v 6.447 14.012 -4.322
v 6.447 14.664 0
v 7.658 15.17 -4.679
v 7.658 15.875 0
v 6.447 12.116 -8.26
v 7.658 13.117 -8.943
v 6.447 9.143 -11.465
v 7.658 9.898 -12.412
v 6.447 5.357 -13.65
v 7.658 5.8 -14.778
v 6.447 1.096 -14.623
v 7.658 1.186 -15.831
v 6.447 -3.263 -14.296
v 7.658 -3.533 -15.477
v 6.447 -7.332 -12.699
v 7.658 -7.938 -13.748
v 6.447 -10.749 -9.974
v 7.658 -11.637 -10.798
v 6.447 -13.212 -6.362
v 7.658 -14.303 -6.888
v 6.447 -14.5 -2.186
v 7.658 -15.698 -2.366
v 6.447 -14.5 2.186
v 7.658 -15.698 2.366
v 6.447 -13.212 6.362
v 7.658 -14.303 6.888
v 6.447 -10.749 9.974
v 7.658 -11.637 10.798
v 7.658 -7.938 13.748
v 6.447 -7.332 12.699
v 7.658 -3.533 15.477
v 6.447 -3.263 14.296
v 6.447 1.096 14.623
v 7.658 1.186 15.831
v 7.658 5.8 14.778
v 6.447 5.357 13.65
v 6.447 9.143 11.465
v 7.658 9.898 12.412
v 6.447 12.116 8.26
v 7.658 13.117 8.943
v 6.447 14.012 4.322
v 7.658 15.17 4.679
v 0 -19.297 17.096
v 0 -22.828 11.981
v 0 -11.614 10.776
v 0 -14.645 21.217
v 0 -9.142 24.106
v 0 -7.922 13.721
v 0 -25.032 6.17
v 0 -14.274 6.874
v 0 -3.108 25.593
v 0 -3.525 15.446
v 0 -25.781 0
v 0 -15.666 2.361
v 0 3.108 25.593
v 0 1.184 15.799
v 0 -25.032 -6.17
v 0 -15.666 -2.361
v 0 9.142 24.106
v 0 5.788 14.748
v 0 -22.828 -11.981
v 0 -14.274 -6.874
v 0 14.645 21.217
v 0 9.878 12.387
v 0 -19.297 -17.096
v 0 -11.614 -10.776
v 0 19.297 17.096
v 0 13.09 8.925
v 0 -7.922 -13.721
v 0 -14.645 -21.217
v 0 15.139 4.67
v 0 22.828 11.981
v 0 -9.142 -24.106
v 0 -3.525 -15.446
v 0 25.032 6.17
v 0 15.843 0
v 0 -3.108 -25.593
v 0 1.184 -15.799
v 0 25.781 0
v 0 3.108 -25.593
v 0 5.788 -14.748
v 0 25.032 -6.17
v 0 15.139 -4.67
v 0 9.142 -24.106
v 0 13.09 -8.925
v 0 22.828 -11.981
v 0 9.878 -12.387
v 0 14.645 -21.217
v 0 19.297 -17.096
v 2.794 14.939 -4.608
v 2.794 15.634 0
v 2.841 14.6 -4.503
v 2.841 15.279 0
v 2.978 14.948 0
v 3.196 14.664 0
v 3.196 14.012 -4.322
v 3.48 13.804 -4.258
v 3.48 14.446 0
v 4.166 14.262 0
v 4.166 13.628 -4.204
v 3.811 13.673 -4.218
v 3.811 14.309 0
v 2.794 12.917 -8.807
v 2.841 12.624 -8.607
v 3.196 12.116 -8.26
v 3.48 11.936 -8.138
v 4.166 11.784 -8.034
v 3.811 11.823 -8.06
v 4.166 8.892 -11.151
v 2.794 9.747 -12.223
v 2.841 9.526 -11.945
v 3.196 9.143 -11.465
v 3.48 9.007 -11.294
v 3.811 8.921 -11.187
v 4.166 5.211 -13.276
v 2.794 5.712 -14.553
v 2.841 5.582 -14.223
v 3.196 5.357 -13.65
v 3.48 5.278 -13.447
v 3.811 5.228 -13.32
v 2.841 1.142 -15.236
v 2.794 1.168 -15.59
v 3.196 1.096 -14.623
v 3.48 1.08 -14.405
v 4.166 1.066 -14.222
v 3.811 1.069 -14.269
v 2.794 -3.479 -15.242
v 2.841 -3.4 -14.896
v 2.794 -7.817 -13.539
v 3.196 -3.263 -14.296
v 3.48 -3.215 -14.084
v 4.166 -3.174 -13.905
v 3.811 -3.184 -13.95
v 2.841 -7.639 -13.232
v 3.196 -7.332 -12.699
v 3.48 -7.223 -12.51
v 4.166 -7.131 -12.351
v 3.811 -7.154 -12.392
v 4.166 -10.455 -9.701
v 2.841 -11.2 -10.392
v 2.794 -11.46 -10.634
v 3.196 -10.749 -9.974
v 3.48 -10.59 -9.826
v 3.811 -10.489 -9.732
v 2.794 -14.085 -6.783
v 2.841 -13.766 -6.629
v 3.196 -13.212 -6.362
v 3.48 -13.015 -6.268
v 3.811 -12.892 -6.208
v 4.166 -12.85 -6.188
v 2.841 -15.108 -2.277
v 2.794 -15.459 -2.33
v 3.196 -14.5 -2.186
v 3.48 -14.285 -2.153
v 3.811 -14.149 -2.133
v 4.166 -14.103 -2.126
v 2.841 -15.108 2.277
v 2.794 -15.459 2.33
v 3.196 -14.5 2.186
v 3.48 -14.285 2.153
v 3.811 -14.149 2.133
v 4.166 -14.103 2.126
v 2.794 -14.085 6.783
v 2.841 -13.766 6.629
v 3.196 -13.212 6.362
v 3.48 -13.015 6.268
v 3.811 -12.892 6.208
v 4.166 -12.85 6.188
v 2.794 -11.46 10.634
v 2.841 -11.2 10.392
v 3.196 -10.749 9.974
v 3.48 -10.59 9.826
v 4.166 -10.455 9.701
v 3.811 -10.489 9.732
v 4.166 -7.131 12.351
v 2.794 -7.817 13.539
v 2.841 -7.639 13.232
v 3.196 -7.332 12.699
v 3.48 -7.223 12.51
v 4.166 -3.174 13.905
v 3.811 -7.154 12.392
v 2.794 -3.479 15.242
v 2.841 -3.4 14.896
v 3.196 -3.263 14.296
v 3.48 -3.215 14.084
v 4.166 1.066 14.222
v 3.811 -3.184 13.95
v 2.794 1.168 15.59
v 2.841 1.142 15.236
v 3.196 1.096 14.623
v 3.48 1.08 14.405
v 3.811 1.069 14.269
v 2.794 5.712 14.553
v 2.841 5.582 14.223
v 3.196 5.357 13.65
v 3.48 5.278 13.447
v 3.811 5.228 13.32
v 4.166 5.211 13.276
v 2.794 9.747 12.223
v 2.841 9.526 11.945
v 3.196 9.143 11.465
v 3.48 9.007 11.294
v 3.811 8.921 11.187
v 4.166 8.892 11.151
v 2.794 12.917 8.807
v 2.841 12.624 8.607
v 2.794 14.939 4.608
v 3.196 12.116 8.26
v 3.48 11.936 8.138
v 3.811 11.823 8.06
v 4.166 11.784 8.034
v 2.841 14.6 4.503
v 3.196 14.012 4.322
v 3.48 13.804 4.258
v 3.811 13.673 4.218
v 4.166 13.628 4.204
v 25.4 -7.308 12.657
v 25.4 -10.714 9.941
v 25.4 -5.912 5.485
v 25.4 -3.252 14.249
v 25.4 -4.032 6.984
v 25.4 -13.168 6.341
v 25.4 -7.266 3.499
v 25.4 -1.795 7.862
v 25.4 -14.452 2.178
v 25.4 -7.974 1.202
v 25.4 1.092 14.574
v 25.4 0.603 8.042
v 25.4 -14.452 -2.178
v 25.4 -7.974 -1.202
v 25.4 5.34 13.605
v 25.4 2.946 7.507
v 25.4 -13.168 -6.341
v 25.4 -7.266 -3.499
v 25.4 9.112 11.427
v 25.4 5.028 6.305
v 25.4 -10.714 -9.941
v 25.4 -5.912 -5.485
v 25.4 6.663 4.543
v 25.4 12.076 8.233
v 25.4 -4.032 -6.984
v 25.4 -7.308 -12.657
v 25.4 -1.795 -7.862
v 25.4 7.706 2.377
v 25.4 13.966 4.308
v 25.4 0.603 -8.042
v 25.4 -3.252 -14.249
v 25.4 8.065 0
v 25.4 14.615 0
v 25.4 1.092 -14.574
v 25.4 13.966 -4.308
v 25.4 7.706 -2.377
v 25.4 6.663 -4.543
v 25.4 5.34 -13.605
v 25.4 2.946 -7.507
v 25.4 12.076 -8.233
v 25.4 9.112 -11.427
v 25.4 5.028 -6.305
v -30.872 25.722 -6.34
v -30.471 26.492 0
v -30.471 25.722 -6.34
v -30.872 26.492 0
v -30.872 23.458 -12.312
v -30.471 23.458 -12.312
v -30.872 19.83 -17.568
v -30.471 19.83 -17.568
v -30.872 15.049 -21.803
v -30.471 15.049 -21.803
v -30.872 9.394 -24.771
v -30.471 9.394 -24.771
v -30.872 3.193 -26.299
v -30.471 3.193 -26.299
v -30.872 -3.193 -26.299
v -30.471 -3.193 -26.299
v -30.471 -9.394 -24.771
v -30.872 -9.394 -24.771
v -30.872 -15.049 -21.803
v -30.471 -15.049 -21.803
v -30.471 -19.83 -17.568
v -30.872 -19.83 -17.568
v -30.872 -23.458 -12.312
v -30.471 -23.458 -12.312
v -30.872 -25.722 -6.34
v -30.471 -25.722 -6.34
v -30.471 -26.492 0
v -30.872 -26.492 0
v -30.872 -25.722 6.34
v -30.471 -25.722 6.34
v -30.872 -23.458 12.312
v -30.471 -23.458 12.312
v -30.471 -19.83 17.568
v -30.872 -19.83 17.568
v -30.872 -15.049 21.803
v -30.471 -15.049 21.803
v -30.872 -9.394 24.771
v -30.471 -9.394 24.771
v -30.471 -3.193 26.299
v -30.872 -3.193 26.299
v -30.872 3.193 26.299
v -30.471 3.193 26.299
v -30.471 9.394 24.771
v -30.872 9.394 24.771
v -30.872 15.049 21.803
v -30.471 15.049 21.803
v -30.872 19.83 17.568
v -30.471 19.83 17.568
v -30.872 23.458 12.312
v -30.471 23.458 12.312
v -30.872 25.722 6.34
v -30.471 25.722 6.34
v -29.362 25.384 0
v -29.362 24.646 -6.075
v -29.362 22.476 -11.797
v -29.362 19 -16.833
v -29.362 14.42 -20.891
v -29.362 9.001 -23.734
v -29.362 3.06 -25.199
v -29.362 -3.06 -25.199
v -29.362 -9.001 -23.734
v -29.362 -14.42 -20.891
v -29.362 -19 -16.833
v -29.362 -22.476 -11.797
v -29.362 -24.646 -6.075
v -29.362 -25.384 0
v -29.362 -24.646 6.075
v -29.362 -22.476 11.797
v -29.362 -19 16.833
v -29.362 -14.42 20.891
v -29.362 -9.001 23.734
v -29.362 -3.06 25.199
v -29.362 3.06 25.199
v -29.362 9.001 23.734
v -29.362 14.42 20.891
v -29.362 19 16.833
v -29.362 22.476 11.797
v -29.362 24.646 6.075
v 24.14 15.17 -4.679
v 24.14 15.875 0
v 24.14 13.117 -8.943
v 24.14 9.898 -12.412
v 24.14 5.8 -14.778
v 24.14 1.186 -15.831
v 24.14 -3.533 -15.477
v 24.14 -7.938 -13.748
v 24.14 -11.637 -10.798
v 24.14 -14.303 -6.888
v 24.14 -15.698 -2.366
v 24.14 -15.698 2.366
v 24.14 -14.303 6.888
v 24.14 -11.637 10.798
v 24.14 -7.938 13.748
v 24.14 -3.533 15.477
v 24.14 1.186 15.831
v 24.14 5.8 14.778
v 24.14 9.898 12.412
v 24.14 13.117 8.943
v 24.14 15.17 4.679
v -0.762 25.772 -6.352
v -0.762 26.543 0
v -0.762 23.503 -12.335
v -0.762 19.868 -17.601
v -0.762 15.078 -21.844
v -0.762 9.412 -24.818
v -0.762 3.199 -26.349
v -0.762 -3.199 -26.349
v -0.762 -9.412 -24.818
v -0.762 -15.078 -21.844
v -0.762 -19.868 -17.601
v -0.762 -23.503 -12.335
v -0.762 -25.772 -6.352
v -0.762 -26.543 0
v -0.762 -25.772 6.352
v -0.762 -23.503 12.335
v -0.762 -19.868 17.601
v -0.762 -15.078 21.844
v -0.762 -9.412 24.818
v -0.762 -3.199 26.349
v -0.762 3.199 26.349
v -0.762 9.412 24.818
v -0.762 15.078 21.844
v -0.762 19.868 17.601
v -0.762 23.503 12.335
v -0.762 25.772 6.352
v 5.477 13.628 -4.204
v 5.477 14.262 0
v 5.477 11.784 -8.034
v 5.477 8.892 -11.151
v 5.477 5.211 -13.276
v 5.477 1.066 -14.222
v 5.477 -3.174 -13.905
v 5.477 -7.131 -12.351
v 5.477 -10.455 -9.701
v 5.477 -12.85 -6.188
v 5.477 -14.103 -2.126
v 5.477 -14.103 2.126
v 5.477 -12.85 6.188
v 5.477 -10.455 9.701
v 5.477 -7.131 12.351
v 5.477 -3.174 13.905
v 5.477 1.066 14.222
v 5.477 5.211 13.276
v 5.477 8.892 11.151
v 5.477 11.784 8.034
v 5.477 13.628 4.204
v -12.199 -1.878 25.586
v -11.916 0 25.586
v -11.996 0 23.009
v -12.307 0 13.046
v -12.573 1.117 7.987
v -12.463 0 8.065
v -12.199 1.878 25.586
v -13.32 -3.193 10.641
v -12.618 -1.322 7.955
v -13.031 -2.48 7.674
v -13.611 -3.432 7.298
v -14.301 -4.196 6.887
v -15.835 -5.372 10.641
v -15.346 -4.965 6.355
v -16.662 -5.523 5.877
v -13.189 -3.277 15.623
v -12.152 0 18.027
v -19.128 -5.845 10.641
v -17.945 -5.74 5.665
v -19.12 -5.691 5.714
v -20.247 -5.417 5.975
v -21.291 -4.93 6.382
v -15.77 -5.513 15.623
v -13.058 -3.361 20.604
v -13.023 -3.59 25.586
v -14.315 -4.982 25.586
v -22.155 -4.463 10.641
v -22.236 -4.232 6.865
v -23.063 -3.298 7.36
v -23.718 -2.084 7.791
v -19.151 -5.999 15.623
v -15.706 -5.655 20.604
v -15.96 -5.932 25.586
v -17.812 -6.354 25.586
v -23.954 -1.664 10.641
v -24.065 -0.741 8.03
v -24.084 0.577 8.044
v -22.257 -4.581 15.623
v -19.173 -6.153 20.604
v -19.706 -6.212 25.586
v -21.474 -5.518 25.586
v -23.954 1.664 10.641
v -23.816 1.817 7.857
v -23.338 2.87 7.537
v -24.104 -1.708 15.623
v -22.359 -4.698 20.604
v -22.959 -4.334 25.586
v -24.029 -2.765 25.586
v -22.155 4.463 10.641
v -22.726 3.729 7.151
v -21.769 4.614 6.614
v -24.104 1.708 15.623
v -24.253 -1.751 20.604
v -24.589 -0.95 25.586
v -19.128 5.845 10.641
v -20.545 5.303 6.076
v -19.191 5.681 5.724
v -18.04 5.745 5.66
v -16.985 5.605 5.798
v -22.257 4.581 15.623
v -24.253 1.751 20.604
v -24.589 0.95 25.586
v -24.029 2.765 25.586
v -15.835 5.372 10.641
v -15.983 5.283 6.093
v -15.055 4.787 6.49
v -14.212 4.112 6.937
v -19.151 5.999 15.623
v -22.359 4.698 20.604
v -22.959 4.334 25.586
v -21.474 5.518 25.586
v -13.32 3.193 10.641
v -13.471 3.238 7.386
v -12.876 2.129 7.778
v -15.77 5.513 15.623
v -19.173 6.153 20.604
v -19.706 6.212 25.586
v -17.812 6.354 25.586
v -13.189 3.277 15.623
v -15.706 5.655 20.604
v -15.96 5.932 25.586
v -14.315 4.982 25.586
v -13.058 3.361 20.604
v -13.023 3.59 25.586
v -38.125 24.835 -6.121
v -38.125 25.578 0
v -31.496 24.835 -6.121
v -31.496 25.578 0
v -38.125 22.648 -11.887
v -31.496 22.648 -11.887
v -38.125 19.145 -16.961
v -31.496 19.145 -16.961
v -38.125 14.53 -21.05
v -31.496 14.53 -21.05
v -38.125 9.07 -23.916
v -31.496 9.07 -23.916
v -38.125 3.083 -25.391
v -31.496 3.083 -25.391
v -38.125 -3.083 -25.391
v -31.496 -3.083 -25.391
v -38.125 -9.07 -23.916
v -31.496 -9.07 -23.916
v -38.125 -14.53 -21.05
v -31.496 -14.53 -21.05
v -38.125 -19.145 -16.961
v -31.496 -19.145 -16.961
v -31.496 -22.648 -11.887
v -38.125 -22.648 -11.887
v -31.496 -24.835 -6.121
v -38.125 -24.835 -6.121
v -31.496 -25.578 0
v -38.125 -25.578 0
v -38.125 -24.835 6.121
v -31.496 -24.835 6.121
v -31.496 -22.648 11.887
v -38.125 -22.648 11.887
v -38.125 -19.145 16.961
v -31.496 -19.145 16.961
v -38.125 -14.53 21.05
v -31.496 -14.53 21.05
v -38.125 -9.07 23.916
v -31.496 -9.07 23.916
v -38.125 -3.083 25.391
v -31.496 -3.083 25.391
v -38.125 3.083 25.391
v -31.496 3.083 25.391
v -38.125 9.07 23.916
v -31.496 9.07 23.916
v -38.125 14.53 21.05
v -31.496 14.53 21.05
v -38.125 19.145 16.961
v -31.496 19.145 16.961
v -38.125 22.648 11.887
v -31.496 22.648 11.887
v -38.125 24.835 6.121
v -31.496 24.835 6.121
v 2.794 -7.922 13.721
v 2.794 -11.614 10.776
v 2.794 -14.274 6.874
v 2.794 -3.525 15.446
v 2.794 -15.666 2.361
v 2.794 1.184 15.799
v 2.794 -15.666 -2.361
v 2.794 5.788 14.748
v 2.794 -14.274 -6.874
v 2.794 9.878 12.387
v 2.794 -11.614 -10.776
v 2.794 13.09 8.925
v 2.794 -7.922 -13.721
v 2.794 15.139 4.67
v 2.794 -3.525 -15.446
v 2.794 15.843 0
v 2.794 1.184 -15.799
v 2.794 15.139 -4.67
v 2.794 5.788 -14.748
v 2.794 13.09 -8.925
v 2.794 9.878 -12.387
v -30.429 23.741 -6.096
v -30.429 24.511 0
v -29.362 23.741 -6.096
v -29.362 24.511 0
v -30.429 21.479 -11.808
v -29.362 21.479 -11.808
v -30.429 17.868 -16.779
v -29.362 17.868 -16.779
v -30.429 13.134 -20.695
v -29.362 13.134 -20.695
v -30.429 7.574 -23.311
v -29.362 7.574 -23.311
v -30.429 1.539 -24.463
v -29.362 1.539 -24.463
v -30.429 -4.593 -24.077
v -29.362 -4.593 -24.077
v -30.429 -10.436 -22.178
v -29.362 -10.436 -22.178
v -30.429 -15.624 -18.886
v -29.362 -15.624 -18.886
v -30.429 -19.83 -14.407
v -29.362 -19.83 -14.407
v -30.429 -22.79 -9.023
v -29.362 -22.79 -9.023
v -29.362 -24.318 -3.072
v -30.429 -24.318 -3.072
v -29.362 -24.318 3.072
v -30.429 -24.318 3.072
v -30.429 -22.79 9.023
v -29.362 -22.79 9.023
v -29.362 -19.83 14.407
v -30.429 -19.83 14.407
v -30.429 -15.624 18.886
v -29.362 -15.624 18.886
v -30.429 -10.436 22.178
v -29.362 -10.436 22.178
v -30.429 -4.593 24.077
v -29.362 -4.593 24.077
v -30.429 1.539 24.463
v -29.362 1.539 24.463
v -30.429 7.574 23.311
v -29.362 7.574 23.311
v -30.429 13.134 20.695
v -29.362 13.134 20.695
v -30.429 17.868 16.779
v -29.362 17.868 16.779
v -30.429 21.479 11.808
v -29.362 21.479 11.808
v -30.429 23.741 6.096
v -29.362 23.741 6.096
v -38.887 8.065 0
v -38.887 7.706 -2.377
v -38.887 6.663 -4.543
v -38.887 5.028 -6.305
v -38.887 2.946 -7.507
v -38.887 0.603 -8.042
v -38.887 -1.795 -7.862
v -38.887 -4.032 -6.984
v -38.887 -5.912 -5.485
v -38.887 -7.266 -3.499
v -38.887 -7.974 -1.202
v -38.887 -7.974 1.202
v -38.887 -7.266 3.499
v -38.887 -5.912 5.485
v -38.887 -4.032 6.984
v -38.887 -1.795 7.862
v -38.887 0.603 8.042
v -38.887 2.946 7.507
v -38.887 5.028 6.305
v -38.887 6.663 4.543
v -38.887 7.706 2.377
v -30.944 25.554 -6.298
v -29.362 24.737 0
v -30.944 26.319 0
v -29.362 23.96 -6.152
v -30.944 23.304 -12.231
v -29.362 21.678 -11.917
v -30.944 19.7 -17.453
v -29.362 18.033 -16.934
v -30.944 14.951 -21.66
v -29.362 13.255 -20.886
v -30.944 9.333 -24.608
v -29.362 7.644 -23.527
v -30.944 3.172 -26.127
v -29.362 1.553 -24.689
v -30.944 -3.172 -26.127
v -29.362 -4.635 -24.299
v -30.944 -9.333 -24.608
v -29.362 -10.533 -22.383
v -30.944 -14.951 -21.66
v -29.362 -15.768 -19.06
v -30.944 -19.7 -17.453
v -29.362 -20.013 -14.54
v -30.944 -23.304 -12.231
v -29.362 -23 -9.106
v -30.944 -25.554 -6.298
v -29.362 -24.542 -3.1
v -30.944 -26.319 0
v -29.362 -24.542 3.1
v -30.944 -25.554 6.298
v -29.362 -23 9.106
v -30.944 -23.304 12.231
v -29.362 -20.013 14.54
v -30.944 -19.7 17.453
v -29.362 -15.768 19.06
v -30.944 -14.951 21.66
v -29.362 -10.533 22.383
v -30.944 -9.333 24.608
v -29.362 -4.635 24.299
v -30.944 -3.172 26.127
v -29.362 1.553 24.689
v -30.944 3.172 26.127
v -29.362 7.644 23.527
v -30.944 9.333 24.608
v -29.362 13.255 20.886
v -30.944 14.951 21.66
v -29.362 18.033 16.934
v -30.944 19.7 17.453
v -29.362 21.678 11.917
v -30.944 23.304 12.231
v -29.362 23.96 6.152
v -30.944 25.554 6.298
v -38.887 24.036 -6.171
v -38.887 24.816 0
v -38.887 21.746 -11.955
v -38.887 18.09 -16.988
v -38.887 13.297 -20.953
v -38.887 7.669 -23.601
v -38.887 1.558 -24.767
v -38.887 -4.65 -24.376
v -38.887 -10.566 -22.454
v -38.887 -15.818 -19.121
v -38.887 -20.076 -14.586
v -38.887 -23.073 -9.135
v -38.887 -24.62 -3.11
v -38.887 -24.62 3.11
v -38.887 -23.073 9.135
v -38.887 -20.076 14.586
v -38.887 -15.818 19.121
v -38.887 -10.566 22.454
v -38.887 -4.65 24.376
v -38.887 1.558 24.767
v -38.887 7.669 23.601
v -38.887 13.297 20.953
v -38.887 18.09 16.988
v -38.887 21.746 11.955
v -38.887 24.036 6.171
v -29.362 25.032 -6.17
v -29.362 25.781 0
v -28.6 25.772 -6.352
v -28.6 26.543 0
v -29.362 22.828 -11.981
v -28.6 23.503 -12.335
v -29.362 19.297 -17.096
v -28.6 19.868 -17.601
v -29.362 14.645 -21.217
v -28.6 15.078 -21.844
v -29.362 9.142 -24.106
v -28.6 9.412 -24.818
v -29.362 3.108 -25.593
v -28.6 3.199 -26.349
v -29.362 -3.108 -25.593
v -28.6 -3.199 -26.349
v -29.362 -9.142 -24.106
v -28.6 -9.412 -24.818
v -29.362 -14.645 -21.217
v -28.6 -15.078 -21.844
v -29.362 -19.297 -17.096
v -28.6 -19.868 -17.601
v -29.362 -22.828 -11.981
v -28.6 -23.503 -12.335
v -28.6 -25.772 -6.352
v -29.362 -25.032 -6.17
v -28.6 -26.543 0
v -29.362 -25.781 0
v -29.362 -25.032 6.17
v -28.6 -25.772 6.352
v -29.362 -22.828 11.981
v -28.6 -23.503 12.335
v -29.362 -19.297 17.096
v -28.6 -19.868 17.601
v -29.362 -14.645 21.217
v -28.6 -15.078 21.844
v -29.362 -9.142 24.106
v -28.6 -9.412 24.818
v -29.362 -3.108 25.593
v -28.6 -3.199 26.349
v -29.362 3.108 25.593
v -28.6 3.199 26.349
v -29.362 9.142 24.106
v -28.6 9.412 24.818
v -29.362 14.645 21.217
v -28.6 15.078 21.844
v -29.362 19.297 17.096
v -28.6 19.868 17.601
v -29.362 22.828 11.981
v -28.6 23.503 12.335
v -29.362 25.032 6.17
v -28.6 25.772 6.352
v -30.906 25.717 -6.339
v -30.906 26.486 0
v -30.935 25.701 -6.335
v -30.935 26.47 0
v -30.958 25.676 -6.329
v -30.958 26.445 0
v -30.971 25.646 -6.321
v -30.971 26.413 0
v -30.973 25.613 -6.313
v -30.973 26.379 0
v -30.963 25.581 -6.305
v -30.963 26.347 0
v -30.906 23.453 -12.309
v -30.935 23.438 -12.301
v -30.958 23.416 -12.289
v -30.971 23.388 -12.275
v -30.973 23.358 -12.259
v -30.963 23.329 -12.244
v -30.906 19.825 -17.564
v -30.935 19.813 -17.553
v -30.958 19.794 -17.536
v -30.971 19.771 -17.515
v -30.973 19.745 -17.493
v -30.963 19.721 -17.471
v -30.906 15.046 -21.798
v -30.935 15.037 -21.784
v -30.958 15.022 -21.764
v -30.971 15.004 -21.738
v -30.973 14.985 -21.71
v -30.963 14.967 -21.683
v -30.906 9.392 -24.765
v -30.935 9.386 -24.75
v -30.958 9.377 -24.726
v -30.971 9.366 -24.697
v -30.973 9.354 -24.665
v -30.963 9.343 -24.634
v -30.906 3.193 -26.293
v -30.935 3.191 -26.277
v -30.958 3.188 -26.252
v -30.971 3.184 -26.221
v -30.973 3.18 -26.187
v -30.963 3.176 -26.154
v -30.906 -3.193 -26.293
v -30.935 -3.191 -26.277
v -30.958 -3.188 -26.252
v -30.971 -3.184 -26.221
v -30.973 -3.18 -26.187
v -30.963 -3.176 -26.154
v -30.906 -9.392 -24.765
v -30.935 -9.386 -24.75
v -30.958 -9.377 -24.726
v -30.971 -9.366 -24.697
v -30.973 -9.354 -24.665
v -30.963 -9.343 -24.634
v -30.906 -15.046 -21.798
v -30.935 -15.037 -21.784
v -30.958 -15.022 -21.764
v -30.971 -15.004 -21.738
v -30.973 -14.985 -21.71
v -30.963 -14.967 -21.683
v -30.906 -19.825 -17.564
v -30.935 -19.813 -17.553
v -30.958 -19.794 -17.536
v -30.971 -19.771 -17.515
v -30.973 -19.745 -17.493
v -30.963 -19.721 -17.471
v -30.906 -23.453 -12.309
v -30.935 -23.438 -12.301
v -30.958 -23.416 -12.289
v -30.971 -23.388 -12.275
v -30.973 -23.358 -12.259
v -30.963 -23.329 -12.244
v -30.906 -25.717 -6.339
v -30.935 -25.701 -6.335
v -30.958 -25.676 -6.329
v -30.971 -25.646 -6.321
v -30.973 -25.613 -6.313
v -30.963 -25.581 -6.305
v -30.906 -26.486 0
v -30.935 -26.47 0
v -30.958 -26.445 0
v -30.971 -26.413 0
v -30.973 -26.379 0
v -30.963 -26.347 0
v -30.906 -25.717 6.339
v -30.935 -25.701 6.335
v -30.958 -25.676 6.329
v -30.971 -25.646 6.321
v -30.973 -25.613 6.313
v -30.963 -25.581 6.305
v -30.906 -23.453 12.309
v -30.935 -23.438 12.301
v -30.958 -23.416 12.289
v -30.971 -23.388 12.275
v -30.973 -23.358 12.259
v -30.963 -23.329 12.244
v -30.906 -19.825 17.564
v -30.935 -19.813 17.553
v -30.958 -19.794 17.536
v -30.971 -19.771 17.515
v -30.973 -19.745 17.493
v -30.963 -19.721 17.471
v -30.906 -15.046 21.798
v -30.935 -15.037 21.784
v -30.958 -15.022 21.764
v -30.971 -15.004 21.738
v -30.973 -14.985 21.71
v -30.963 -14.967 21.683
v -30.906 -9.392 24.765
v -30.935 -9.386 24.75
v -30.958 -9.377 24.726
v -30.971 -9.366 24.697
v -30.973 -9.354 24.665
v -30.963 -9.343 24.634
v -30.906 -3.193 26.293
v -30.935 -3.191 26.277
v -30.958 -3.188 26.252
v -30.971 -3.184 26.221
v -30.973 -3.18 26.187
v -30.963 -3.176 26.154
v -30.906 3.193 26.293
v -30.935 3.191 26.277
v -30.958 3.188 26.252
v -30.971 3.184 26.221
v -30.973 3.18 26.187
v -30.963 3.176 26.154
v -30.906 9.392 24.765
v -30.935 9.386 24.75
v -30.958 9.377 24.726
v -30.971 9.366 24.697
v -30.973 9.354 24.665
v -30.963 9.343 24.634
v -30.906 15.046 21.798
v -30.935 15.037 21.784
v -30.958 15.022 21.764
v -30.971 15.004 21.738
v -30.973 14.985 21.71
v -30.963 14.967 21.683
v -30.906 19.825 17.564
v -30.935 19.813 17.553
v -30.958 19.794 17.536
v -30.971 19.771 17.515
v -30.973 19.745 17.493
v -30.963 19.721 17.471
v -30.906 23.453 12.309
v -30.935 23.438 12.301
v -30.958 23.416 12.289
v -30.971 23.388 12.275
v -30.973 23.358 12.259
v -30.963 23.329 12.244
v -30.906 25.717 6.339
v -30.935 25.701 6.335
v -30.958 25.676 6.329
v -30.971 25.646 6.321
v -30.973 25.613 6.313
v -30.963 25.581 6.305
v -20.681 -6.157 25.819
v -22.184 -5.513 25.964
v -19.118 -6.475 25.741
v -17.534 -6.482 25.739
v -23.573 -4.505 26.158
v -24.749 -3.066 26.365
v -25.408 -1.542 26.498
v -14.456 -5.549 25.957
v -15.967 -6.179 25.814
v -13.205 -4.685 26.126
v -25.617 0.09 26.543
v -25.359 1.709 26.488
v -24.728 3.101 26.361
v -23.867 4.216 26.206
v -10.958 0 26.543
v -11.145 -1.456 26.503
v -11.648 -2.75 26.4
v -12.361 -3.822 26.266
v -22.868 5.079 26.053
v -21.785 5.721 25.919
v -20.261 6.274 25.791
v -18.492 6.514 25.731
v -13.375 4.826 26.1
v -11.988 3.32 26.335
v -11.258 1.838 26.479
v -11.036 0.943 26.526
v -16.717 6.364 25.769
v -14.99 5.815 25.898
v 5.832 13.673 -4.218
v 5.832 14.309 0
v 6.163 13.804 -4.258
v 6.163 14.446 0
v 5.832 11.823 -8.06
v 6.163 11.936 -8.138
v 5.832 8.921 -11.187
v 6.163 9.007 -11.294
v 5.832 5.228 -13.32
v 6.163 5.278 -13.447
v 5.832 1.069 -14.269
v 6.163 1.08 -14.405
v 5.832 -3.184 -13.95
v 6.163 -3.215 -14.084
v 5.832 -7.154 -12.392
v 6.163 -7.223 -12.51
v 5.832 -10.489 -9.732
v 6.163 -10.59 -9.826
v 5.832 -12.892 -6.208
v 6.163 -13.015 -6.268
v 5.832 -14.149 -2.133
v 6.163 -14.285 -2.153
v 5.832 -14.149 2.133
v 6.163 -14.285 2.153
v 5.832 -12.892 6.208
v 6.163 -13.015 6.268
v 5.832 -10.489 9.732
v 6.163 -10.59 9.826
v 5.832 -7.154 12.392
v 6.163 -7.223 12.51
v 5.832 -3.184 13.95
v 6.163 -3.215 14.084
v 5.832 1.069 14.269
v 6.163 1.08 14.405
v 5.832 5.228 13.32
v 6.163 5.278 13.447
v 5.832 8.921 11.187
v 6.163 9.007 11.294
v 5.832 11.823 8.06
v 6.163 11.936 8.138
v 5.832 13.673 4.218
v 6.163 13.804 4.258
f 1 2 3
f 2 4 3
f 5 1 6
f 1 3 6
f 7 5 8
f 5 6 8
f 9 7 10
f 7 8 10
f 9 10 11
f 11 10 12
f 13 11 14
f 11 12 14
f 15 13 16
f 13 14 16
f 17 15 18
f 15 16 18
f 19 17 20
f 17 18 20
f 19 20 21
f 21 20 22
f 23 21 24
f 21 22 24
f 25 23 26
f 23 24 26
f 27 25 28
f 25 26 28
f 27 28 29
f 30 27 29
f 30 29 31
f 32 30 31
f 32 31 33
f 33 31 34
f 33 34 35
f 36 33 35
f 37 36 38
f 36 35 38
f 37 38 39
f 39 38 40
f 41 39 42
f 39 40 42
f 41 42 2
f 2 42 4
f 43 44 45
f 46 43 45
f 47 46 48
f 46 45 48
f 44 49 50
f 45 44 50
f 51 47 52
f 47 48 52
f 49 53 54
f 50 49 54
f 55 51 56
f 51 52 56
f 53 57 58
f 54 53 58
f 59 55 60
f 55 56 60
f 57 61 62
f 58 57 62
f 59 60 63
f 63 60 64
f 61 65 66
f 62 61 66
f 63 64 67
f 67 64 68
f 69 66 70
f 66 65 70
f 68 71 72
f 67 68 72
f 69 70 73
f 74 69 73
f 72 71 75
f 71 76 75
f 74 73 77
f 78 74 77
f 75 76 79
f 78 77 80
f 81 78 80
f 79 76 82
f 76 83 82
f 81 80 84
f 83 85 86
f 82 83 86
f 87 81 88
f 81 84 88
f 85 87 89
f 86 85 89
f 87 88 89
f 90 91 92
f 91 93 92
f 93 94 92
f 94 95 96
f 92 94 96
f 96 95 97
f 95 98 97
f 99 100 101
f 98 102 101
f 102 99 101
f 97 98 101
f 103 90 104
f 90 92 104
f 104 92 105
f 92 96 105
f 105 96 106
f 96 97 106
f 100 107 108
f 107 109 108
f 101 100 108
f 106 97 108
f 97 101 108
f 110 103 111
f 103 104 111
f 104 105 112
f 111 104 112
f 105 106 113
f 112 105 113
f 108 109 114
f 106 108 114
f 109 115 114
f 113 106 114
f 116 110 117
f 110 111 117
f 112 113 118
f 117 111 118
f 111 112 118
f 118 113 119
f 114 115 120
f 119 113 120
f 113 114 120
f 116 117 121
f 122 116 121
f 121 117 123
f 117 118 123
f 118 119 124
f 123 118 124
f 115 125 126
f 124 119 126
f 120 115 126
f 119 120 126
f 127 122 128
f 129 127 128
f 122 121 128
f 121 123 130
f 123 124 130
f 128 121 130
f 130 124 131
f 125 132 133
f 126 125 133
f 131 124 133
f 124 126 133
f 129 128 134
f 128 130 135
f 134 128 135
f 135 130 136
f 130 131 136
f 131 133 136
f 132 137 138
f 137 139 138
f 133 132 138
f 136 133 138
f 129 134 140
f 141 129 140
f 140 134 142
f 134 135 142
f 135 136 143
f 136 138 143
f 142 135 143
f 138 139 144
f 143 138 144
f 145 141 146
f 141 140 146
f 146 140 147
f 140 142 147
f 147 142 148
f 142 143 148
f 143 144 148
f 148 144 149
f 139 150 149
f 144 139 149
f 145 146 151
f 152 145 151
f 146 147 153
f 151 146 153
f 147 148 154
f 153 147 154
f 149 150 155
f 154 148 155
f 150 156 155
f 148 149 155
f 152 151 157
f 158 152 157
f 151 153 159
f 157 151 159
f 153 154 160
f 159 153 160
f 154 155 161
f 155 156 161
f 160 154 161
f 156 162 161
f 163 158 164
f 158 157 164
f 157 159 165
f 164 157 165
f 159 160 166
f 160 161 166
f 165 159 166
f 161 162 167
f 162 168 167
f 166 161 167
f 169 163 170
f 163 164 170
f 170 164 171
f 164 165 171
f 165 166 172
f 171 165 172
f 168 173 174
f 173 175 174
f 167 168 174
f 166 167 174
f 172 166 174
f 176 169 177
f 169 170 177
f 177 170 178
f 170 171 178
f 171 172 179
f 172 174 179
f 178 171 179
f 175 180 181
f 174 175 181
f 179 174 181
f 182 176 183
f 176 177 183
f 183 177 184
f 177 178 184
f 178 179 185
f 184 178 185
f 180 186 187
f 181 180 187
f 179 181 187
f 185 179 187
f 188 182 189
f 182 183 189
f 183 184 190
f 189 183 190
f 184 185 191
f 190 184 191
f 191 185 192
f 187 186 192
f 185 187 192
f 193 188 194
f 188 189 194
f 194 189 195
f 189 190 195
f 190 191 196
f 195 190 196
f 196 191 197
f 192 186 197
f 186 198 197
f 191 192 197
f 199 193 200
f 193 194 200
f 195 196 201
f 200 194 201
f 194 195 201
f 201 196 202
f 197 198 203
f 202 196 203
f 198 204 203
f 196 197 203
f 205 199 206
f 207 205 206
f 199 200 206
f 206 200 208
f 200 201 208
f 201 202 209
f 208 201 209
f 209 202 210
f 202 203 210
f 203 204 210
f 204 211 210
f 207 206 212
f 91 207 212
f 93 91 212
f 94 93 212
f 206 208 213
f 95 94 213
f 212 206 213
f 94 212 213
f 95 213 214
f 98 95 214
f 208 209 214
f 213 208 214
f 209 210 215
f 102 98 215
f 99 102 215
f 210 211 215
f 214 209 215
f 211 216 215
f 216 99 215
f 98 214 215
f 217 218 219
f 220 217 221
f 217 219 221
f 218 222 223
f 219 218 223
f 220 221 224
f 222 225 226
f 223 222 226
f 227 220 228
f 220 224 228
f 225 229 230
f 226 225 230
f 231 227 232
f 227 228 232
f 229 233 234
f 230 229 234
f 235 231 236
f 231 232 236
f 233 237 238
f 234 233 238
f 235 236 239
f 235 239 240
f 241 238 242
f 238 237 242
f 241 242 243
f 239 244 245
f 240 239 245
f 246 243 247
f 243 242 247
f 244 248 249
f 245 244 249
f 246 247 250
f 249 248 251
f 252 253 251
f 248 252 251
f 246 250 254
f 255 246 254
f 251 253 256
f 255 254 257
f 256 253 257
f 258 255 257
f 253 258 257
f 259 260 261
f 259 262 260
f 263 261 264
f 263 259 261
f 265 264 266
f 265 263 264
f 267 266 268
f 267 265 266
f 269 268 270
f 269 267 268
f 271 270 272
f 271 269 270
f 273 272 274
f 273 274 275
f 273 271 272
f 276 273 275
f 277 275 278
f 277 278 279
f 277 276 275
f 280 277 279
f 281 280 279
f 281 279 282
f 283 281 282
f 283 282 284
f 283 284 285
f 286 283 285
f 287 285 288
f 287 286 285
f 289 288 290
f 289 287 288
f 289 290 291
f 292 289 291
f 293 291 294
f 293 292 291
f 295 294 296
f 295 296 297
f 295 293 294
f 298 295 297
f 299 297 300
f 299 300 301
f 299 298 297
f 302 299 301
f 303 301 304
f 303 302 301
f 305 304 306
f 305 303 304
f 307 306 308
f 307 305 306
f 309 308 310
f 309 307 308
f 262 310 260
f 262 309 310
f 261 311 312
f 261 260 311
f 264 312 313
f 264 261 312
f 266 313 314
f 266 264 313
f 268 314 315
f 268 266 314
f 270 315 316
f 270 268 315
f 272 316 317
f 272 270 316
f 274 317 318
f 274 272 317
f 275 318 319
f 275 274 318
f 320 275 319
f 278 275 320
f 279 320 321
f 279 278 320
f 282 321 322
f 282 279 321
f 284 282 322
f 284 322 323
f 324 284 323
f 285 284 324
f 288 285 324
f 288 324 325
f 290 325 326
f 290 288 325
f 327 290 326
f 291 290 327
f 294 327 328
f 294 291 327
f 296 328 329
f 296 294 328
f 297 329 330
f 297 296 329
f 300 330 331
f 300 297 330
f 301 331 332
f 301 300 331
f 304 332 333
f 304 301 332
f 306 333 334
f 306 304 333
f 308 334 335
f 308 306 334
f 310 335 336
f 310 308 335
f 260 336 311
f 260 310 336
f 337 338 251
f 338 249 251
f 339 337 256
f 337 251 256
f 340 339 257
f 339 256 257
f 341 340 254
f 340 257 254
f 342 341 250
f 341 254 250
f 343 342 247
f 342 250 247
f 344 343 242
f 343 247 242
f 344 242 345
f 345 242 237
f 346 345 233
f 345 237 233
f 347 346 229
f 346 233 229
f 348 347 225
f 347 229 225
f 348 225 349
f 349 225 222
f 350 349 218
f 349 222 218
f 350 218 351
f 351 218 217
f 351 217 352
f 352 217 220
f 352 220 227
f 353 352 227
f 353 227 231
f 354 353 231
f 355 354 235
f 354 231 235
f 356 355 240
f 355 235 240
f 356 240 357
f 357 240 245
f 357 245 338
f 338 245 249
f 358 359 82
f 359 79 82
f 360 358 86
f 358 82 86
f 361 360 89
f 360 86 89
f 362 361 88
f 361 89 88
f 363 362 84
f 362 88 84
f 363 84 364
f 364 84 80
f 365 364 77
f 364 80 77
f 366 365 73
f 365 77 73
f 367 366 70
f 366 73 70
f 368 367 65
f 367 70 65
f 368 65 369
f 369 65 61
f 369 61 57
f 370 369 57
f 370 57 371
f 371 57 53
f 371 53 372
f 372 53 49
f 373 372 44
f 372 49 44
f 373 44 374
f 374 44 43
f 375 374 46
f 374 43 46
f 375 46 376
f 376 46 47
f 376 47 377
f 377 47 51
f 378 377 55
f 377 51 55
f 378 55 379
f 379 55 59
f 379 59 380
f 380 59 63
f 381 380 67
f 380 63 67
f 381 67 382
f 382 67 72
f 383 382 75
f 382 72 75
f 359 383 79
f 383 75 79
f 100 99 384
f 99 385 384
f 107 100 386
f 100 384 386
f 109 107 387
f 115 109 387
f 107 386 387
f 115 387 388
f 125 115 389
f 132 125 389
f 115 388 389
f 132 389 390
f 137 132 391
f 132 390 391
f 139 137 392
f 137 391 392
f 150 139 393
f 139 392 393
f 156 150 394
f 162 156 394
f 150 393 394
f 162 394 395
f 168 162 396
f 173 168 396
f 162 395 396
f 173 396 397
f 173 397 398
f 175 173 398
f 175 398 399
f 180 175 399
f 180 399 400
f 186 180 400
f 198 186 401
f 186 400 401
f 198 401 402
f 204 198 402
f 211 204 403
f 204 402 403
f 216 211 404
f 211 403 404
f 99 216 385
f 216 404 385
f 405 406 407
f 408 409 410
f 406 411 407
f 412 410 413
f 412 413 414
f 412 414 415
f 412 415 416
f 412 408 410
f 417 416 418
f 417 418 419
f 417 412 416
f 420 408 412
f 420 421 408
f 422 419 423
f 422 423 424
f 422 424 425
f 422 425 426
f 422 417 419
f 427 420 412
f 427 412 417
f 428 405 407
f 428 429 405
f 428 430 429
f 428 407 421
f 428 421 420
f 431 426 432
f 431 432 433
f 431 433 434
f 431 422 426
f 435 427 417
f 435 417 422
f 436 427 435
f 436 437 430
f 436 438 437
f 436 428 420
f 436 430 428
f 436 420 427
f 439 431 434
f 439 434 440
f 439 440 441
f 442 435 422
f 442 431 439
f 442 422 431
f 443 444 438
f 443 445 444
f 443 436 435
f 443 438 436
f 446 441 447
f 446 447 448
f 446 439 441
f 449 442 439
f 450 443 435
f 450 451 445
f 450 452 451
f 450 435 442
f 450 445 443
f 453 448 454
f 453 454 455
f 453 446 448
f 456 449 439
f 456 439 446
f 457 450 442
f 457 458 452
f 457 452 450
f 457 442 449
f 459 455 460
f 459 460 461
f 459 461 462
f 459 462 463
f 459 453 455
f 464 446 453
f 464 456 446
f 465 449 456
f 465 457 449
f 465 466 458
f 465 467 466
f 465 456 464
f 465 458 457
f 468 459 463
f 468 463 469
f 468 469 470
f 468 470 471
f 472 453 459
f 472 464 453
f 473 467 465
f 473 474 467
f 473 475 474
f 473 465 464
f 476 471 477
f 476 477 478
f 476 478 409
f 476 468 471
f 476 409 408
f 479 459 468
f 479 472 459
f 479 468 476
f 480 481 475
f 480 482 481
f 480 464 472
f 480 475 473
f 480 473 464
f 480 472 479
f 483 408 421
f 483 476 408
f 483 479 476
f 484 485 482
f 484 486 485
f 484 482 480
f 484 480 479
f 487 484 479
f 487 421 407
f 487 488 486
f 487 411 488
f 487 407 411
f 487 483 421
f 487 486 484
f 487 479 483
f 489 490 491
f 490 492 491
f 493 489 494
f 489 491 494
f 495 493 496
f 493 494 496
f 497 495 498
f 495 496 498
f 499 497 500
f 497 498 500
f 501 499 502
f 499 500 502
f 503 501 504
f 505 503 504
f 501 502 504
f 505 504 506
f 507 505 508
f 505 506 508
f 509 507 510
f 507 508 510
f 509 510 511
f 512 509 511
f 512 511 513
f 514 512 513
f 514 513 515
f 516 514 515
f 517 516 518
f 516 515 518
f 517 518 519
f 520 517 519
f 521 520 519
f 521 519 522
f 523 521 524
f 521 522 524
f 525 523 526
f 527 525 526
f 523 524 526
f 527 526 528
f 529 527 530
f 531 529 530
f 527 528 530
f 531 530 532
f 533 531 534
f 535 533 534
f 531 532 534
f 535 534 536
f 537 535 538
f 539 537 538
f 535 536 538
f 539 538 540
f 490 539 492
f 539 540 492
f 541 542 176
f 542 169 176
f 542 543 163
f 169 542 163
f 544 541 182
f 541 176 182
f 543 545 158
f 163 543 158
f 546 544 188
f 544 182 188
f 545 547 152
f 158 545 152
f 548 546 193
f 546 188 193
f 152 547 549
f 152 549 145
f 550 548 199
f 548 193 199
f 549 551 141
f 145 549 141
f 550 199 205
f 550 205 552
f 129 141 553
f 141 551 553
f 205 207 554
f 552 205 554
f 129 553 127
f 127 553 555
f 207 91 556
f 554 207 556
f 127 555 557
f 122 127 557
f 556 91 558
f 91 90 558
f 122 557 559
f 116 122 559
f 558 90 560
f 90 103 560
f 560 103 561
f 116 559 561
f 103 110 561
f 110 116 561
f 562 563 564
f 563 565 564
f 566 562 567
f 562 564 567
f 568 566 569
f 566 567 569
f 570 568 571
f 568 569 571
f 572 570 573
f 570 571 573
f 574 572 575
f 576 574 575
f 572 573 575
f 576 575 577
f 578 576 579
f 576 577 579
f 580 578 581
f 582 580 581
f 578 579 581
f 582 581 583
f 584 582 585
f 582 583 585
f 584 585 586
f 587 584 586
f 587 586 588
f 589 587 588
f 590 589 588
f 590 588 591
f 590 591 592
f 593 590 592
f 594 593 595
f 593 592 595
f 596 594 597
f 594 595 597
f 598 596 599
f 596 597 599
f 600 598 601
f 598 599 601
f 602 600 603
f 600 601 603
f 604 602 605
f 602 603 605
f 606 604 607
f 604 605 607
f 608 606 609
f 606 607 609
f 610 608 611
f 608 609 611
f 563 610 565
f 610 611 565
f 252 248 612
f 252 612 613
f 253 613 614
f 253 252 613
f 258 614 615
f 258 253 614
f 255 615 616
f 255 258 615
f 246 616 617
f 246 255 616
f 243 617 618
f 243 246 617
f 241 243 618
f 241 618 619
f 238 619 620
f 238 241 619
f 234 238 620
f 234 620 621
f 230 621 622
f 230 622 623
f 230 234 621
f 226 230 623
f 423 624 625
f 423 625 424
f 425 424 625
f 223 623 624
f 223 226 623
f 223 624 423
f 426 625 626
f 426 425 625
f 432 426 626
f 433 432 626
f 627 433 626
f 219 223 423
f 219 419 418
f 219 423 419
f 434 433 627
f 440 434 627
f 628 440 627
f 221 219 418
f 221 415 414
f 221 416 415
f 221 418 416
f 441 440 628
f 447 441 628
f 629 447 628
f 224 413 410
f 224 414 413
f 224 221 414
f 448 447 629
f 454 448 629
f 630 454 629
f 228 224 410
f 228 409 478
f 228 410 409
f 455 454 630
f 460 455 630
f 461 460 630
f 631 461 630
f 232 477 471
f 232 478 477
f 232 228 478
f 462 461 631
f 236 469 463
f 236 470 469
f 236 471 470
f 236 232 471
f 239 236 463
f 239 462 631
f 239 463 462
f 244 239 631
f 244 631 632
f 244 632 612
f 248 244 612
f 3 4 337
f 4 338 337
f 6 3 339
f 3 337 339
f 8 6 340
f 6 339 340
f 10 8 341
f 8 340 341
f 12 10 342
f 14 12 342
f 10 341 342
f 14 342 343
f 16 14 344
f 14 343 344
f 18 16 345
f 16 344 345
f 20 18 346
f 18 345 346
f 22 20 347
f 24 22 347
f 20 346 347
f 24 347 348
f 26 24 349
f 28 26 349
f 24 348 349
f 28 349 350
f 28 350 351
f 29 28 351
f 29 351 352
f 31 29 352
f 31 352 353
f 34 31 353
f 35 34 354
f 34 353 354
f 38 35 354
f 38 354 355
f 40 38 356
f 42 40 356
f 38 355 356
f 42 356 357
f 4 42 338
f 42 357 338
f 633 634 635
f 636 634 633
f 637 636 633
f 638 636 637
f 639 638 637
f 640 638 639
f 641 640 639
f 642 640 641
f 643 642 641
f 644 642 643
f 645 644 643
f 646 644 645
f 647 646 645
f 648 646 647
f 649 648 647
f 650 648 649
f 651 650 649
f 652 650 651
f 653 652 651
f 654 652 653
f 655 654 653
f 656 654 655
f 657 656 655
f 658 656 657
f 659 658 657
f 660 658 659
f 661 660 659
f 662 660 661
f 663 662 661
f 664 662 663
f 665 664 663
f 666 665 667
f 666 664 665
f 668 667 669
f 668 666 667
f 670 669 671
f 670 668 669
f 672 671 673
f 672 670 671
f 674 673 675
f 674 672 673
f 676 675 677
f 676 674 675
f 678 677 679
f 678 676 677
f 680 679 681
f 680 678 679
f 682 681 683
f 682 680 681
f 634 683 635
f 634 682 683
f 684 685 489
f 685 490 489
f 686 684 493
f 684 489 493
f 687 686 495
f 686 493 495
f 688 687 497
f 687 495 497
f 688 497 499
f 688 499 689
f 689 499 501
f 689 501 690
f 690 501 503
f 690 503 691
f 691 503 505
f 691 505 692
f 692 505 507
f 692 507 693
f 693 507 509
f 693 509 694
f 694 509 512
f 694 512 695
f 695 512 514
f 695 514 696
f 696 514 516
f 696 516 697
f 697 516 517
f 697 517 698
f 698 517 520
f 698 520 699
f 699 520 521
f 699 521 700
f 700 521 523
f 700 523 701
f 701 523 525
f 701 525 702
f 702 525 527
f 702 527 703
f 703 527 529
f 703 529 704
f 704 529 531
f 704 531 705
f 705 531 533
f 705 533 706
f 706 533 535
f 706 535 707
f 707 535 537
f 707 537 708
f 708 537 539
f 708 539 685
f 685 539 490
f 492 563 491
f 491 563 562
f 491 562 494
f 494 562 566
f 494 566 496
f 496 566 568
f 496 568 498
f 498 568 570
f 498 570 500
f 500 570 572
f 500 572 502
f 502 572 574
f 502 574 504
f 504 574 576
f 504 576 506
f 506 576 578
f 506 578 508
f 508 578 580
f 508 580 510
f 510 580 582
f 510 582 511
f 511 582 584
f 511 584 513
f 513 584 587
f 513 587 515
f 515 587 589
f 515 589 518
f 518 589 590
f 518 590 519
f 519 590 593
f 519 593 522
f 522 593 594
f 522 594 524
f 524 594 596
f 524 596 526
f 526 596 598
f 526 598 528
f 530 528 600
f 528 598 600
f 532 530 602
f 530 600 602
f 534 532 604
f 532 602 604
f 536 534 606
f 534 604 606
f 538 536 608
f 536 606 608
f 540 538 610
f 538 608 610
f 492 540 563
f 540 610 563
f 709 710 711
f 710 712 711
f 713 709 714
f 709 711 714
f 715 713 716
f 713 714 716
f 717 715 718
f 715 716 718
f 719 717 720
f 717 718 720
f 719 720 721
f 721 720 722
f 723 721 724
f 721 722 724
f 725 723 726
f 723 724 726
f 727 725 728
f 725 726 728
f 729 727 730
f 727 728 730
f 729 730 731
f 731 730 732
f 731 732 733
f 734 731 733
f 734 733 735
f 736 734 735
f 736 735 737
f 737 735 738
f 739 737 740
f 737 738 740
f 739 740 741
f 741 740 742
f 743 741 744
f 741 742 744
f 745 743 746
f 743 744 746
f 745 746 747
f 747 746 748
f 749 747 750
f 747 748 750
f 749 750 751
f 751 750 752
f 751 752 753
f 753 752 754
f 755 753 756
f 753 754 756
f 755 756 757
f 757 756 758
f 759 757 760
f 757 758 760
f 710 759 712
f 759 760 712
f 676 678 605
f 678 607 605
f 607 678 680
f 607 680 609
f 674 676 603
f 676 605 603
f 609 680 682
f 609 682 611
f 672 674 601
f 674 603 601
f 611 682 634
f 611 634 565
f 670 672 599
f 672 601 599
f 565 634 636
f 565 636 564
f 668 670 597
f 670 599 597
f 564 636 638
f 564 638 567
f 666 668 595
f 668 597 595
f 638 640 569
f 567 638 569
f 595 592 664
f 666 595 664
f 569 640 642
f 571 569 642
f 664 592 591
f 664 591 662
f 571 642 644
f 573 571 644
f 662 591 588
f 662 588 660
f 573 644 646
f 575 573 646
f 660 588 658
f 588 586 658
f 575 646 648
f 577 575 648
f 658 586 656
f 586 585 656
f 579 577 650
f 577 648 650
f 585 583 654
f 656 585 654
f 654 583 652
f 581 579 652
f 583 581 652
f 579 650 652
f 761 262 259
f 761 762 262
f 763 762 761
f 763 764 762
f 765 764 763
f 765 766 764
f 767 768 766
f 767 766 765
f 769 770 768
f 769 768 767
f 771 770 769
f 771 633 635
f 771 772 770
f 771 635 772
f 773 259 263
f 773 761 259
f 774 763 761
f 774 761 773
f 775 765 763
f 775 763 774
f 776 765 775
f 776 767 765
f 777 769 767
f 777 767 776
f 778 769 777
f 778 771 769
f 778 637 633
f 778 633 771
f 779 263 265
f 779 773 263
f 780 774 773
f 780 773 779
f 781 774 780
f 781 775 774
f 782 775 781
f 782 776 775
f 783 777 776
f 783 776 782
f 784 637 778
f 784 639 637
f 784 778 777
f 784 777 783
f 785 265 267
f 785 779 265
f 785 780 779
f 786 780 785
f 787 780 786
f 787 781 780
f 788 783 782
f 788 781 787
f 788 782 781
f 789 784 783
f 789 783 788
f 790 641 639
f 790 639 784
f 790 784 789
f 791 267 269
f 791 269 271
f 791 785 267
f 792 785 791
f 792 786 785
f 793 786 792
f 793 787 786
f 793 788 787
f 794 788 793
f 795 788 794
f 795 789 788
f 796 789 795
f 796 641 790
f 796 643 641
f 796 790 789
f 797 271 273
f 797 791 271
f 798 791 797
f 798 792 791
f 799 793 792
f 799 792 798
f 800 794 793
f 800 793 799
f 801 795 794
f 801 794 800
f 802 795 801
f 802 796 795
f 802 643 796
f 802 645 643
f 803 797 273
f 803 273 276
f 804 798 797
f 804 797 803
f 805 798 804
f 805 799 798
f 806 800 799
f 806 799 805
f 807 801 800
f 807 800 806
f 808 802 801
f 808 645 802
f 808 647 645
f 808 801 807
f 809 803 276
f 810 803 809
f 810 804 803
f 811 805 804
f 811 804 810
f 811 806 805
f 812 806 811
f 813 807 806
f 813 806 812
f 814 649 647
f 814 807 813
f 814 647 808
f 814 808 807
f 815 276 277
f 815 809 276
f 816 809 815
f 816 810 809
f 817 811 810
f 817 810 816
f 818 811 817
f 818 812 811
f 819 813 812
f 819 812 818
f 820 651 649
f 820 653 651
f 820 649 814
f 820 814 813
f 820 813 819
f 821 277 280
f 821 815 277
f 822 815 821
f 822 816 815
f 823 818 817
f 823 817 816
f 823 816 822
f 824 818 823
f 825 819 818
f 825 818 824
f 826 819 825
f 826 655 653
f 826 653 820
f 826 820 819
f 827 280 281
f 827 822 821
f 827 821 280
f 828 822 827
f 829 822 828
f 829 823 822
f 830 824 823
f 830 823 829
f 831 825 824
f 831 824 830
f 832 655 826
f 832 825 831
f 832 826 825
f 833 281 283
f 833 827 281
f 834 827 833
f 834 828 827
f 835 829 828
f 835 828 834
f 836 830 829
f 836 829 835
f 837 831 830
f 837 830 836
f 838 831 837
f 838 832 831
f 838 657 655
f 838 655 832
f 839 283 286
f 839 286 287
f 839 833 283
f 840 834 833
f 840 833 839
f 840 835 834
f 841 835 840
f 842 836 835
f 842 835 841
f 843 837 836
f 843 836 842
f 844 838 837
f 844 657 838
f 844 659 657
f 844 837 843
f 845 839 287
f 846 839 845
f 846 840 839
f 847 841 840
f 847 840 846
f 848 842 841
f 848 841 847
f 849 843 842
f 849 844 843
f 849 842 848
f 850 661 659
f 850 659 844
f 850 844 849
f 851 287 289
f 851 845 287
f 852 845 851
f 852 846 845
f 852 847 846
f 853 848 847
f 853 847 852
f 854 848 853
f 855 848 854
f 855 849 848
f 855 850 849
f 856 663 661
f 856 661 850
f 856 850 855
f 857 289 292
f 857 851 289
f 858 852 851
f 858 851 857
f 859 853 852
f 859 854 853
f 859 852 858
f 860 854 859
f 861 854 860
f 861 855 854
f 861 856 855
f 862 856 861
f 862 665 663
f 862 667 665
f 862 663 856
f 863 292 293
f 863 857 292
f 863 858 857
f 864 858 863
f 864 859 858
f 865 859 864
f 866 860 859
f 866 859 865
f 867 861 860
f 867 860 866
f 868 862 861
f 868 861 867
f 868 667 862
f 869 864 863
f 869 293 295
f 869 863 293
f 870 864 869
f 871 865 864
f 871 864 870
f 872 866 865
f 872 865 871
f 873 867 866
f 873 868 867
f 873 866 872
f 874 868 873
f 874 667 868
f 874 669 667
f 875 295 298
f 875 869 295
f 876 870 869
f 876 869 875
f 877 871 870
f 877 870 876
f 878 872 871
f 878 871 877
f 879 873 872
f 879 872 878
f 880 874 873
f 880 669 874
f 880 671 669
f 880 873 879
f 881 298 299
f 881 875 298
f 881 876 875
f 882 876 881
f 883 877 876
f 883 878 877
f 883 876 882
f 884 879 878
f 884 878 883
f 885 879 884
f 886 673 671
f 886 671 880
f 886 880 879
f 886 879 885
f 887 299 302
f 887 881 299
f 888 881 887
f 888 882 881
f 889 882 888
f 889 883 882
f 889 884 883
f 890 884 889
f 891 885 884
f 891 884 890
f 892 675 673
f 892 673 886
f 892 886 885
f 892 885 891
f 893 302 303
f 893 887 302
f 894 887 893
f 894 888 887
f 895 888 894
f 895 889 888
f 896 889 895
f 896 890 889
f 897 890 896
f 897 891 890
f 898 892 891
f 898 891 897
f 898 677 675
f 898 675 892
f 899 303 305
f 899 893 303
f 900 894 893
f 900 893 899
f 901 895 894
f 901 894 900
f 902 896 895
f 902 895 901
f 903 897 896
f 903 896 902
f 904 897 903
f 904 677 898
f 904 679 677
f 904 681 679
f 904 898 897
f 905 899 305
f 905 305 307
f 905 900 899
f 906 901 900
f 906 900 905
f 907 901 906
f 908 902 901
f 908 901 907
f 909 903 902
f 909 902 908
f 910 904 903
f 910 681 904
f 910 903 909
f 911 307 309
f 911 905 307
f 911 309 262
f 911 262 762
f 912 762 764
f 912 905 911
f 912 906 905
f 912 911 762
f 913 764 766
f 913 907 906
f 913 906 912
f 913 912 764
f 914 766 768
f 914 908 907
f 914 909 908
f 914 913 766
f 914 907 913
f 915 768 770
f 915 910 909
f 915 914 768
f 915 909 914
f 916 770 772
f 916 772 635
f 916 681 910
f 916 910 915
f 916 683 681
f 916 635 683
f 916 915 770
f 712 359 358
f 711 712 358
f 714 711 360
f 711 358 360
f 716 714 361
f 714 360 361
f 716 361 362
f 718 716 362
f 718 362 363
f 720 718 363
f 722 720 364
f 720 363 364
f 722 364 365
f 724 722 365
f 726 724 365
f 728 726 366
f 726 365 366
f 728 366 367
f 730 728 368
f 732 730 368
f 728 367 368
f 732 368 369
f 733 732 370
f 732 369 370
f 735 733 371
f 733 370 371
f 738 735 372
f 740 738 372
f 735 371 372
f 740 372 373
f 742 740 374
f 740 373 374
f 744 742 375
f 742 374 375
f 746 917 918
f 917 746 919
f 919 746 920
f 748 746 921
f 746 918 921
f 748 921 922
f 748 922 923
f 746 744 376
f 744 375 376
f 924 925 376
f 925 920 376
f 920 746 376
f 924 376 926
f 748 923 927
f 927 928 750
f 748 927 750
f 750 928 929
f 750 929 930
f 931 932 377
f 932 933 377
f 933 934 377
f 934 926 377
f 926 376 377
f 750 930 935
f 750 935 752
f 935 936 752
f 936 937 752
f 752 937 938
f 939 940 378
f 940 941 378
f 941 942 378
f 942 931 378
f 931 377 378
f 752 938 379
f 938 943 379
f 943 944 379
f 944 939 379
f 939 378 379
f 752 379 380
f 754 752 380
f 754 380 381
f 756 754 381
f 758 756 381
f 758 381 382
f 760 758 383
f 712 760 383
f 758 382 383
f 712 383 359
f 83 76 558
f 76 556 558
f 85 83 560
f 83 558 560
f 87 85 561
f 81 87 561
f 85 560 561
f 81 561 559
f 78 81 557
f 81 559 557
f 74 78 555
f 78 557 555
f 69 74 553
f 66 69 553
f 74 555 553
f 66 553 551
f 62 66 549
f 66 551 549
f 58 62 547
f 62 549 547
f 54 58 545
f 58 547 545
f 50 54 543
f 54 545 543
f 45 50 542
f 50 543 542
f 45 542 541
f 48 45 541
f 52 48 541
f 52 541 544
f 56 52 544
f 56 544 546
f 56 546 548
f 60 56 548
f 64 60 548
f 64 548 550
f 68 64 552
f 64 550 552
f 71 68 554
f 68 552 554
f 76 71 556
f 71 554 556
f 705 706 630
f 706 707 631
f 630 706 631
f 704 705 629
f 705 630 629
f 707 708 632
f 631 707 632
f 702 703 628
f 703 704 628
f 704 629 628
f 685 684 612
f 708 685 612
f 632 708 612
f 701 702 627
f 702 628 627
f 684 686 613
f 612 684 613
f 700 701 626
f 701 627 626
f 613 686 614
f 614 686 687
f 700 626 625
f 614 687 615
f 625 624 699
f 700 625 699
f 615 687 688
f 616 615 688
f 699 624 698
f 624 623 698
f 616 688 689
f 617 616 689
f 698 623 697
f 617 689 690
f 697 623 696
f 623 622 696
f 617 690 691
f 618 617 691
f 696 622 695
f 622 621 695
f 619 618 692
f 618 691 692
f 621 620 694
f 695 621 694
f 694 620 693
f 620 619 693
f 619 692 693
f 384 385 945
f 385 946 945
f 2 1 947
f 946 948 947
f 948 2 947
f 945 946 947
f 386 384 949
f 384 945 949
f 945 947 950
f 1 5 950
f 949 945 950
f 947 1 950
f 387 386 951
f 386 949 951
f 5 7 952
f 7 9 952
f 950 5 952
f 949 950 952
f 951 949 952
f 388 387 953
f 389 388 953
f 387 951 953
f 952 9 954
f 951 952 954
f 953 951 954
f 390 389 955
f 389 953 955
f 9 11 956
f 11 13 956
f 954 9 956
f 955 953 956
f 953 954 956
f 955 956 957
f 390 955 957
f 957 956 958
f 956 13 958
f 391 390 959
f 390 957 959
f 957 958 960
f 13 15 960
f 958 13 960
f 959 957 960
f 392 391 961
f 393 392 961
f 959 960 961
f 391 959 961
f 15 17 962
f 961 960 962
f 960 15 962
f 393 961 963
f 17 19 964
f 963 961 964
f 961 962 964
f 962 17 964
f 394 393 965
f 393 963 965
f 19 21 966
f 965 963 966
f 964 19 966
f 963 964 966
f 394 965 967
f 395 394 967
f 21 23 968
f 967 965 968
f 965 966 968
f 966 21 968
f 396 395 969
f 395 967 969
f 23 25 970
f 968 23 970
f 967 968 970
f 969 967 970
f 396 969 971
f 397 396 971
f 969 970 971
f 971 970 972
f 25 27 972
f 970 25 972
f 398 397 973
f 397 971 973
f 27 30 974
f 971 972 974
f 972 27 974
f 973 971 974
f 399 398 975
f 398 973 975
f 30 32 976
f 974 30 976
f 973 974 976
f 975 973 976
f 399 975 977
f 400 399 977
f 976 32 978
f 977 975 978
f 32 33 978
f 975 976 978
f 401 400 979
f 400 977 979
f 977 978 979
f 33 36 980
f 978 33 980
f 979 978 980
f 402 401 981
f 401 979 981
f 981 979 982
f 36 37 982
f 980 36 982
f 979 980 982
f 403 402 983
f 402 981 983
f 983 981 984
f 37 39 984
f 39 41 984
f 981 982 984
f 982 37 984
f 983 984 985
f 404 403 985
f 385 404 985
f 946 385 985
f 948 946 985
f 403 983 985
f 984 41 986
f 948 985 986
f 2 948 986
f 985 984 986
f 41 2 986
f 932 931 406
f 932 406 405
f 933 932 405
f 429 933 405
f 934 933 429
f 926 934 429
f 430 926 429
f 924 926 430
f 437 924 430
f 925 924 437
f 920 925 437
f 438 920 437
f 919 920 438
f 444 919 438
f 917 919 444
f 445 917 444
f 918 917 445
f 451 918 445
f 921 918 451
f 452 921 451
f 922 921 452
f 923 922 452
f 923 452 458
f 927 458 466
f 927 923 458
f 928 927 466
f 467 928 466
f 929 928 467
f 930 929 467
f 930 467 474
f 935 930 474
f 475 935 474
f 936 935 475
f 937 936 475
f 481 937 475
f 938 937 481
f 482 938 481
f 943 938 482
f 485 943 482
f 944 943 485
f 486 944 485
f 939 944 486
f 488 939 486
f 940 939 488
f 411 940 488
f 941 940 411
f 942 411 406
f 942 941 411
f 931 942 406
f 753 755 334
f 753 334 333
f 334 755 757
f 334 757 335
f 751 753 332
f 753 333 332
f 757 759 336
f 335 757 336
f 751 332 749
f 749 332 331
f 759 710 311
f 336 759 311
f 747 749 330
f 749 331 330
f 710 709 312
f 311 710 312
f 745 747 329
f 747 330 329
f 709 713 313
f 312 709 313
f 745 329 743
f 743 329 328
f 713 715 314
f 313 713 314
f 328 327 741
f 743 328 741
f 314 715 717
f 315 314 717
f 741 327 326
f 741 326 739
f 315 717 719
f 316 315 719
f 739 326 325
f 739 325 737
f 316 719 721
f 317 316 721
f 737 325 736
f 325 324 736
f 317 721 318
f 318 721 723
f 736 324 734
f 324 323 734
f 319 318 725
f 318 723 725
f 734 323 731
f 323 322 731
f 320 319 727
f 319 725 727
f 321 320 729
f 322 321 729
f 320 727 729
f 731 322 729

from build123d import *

# Parameters (mm, degrees)
SKETCH5_W = 73.9394
SKETCH5_H = 8.0645


with BuildPart() as part:
    # Sketch1 → Revolve1 (revolve)
    with BuildSketch(Plane.XY):
        Polygon((-38.8874, 0), (-38.8874, 24.8158), (-38.1254, 25.5778), (-31.496, 25.5778), (-30.4292, 24.511), (-29.3624, 24.511), (-29.3624, 25.781), (-28.6004, 26.543), (-0.762, 26.543), (0, 25.781), (0, 0), align=None)
    revolve(axis=Axis((0, 0, 0), (-1, 0, 0)))

    # Sketch2 → Revolve2 (revolve)
    with BuildSketch(Plane.XY):
        with BuildLine():
            Line((0, 0), (0, 15.84325))
            Line((0, 15.84325), (2.794, 15.84325))
            Line((2.794, 15.84325), (2.794, 15.6337))
            ThreePointArc((2.794, 15.6337), (3.195732339, 14.663832339), (4.1656, 14.2621))
            Line((4.1656, 14.2621), (5.477064678, 14.2621))
            ThreePointArc((5.477064678, 14.2621), (6.001953274, 14.366506833), (6.446932339, 14.663832339))
            Line((6.446932339, 14.663832339), (7.6581, 15.875))
            Line((7.6581, 15.875), (24.14016, 15.875))
            Line((24.14016, 15.875), (25.4, 14.61516))
            Line((25.4, 14.61516), (25.4, 0))
            Line((25.4, 0), (0, 0))
        make_face()
    revolve(axis=Axis((25.4, 0, 0), (-1, 0, 0)))

    # Sketch3 → Cut-Revolve1 (revolve, cut)
    with BuildSketch(Plane(origin=(0, 0, 0), x_dir=(1, 0, 0), z_dir=(0, 1, 0))):
        Polygon((-18.288, 0), (-12.612335918, -3.276846186), (-11.915865896, -25.585630358), (-10.958496254, -26.543), (-10.958496254, -29.083), (-18.288, -29.083), align=None)
    revolve(axis=Axis((-18.288, 0, 29.083), (0, 0, -1)), mode=Mode.SUBTRACT)

    # Sketch4 → Revolve3 (revolve)
    with BuildSketch(Plane.XY):
        with BuildLine():
            Line((-30.94380107, 26.318757951), (-28.812753898, 24.18771078))
            Line((-28.812753898, 24.18771078), (-28.489464678, 24.511))
            Line((-28.489464678, 24.511), (-30.470664678, 26.4922))
            Line((-30.470664678, 26.4922), (-30.871959021, 26.4922))
            ThreePointArc((-30.871959021, 26.4922), (-30.965825181, 26.429480637), (-30.94380107, 26.318757951))
        make_face()
    revolve(axis=Axis((-30.470664678, 0, 0), (-1, 0, 0)))

    # Sketch5 → Cut-Revolve2 (revolve, cut)
    with BuildSketch(Plane.XY):
        with Locations((-1.9177, 4.03225)):
            Rectangle(SKETCH5_W, SKETCH5_H)
    revolve(axis=Axis((35.052, 0, 0), (-1, 0, 0)), mode=Mode.SUBTRACT)


solid = part.part
